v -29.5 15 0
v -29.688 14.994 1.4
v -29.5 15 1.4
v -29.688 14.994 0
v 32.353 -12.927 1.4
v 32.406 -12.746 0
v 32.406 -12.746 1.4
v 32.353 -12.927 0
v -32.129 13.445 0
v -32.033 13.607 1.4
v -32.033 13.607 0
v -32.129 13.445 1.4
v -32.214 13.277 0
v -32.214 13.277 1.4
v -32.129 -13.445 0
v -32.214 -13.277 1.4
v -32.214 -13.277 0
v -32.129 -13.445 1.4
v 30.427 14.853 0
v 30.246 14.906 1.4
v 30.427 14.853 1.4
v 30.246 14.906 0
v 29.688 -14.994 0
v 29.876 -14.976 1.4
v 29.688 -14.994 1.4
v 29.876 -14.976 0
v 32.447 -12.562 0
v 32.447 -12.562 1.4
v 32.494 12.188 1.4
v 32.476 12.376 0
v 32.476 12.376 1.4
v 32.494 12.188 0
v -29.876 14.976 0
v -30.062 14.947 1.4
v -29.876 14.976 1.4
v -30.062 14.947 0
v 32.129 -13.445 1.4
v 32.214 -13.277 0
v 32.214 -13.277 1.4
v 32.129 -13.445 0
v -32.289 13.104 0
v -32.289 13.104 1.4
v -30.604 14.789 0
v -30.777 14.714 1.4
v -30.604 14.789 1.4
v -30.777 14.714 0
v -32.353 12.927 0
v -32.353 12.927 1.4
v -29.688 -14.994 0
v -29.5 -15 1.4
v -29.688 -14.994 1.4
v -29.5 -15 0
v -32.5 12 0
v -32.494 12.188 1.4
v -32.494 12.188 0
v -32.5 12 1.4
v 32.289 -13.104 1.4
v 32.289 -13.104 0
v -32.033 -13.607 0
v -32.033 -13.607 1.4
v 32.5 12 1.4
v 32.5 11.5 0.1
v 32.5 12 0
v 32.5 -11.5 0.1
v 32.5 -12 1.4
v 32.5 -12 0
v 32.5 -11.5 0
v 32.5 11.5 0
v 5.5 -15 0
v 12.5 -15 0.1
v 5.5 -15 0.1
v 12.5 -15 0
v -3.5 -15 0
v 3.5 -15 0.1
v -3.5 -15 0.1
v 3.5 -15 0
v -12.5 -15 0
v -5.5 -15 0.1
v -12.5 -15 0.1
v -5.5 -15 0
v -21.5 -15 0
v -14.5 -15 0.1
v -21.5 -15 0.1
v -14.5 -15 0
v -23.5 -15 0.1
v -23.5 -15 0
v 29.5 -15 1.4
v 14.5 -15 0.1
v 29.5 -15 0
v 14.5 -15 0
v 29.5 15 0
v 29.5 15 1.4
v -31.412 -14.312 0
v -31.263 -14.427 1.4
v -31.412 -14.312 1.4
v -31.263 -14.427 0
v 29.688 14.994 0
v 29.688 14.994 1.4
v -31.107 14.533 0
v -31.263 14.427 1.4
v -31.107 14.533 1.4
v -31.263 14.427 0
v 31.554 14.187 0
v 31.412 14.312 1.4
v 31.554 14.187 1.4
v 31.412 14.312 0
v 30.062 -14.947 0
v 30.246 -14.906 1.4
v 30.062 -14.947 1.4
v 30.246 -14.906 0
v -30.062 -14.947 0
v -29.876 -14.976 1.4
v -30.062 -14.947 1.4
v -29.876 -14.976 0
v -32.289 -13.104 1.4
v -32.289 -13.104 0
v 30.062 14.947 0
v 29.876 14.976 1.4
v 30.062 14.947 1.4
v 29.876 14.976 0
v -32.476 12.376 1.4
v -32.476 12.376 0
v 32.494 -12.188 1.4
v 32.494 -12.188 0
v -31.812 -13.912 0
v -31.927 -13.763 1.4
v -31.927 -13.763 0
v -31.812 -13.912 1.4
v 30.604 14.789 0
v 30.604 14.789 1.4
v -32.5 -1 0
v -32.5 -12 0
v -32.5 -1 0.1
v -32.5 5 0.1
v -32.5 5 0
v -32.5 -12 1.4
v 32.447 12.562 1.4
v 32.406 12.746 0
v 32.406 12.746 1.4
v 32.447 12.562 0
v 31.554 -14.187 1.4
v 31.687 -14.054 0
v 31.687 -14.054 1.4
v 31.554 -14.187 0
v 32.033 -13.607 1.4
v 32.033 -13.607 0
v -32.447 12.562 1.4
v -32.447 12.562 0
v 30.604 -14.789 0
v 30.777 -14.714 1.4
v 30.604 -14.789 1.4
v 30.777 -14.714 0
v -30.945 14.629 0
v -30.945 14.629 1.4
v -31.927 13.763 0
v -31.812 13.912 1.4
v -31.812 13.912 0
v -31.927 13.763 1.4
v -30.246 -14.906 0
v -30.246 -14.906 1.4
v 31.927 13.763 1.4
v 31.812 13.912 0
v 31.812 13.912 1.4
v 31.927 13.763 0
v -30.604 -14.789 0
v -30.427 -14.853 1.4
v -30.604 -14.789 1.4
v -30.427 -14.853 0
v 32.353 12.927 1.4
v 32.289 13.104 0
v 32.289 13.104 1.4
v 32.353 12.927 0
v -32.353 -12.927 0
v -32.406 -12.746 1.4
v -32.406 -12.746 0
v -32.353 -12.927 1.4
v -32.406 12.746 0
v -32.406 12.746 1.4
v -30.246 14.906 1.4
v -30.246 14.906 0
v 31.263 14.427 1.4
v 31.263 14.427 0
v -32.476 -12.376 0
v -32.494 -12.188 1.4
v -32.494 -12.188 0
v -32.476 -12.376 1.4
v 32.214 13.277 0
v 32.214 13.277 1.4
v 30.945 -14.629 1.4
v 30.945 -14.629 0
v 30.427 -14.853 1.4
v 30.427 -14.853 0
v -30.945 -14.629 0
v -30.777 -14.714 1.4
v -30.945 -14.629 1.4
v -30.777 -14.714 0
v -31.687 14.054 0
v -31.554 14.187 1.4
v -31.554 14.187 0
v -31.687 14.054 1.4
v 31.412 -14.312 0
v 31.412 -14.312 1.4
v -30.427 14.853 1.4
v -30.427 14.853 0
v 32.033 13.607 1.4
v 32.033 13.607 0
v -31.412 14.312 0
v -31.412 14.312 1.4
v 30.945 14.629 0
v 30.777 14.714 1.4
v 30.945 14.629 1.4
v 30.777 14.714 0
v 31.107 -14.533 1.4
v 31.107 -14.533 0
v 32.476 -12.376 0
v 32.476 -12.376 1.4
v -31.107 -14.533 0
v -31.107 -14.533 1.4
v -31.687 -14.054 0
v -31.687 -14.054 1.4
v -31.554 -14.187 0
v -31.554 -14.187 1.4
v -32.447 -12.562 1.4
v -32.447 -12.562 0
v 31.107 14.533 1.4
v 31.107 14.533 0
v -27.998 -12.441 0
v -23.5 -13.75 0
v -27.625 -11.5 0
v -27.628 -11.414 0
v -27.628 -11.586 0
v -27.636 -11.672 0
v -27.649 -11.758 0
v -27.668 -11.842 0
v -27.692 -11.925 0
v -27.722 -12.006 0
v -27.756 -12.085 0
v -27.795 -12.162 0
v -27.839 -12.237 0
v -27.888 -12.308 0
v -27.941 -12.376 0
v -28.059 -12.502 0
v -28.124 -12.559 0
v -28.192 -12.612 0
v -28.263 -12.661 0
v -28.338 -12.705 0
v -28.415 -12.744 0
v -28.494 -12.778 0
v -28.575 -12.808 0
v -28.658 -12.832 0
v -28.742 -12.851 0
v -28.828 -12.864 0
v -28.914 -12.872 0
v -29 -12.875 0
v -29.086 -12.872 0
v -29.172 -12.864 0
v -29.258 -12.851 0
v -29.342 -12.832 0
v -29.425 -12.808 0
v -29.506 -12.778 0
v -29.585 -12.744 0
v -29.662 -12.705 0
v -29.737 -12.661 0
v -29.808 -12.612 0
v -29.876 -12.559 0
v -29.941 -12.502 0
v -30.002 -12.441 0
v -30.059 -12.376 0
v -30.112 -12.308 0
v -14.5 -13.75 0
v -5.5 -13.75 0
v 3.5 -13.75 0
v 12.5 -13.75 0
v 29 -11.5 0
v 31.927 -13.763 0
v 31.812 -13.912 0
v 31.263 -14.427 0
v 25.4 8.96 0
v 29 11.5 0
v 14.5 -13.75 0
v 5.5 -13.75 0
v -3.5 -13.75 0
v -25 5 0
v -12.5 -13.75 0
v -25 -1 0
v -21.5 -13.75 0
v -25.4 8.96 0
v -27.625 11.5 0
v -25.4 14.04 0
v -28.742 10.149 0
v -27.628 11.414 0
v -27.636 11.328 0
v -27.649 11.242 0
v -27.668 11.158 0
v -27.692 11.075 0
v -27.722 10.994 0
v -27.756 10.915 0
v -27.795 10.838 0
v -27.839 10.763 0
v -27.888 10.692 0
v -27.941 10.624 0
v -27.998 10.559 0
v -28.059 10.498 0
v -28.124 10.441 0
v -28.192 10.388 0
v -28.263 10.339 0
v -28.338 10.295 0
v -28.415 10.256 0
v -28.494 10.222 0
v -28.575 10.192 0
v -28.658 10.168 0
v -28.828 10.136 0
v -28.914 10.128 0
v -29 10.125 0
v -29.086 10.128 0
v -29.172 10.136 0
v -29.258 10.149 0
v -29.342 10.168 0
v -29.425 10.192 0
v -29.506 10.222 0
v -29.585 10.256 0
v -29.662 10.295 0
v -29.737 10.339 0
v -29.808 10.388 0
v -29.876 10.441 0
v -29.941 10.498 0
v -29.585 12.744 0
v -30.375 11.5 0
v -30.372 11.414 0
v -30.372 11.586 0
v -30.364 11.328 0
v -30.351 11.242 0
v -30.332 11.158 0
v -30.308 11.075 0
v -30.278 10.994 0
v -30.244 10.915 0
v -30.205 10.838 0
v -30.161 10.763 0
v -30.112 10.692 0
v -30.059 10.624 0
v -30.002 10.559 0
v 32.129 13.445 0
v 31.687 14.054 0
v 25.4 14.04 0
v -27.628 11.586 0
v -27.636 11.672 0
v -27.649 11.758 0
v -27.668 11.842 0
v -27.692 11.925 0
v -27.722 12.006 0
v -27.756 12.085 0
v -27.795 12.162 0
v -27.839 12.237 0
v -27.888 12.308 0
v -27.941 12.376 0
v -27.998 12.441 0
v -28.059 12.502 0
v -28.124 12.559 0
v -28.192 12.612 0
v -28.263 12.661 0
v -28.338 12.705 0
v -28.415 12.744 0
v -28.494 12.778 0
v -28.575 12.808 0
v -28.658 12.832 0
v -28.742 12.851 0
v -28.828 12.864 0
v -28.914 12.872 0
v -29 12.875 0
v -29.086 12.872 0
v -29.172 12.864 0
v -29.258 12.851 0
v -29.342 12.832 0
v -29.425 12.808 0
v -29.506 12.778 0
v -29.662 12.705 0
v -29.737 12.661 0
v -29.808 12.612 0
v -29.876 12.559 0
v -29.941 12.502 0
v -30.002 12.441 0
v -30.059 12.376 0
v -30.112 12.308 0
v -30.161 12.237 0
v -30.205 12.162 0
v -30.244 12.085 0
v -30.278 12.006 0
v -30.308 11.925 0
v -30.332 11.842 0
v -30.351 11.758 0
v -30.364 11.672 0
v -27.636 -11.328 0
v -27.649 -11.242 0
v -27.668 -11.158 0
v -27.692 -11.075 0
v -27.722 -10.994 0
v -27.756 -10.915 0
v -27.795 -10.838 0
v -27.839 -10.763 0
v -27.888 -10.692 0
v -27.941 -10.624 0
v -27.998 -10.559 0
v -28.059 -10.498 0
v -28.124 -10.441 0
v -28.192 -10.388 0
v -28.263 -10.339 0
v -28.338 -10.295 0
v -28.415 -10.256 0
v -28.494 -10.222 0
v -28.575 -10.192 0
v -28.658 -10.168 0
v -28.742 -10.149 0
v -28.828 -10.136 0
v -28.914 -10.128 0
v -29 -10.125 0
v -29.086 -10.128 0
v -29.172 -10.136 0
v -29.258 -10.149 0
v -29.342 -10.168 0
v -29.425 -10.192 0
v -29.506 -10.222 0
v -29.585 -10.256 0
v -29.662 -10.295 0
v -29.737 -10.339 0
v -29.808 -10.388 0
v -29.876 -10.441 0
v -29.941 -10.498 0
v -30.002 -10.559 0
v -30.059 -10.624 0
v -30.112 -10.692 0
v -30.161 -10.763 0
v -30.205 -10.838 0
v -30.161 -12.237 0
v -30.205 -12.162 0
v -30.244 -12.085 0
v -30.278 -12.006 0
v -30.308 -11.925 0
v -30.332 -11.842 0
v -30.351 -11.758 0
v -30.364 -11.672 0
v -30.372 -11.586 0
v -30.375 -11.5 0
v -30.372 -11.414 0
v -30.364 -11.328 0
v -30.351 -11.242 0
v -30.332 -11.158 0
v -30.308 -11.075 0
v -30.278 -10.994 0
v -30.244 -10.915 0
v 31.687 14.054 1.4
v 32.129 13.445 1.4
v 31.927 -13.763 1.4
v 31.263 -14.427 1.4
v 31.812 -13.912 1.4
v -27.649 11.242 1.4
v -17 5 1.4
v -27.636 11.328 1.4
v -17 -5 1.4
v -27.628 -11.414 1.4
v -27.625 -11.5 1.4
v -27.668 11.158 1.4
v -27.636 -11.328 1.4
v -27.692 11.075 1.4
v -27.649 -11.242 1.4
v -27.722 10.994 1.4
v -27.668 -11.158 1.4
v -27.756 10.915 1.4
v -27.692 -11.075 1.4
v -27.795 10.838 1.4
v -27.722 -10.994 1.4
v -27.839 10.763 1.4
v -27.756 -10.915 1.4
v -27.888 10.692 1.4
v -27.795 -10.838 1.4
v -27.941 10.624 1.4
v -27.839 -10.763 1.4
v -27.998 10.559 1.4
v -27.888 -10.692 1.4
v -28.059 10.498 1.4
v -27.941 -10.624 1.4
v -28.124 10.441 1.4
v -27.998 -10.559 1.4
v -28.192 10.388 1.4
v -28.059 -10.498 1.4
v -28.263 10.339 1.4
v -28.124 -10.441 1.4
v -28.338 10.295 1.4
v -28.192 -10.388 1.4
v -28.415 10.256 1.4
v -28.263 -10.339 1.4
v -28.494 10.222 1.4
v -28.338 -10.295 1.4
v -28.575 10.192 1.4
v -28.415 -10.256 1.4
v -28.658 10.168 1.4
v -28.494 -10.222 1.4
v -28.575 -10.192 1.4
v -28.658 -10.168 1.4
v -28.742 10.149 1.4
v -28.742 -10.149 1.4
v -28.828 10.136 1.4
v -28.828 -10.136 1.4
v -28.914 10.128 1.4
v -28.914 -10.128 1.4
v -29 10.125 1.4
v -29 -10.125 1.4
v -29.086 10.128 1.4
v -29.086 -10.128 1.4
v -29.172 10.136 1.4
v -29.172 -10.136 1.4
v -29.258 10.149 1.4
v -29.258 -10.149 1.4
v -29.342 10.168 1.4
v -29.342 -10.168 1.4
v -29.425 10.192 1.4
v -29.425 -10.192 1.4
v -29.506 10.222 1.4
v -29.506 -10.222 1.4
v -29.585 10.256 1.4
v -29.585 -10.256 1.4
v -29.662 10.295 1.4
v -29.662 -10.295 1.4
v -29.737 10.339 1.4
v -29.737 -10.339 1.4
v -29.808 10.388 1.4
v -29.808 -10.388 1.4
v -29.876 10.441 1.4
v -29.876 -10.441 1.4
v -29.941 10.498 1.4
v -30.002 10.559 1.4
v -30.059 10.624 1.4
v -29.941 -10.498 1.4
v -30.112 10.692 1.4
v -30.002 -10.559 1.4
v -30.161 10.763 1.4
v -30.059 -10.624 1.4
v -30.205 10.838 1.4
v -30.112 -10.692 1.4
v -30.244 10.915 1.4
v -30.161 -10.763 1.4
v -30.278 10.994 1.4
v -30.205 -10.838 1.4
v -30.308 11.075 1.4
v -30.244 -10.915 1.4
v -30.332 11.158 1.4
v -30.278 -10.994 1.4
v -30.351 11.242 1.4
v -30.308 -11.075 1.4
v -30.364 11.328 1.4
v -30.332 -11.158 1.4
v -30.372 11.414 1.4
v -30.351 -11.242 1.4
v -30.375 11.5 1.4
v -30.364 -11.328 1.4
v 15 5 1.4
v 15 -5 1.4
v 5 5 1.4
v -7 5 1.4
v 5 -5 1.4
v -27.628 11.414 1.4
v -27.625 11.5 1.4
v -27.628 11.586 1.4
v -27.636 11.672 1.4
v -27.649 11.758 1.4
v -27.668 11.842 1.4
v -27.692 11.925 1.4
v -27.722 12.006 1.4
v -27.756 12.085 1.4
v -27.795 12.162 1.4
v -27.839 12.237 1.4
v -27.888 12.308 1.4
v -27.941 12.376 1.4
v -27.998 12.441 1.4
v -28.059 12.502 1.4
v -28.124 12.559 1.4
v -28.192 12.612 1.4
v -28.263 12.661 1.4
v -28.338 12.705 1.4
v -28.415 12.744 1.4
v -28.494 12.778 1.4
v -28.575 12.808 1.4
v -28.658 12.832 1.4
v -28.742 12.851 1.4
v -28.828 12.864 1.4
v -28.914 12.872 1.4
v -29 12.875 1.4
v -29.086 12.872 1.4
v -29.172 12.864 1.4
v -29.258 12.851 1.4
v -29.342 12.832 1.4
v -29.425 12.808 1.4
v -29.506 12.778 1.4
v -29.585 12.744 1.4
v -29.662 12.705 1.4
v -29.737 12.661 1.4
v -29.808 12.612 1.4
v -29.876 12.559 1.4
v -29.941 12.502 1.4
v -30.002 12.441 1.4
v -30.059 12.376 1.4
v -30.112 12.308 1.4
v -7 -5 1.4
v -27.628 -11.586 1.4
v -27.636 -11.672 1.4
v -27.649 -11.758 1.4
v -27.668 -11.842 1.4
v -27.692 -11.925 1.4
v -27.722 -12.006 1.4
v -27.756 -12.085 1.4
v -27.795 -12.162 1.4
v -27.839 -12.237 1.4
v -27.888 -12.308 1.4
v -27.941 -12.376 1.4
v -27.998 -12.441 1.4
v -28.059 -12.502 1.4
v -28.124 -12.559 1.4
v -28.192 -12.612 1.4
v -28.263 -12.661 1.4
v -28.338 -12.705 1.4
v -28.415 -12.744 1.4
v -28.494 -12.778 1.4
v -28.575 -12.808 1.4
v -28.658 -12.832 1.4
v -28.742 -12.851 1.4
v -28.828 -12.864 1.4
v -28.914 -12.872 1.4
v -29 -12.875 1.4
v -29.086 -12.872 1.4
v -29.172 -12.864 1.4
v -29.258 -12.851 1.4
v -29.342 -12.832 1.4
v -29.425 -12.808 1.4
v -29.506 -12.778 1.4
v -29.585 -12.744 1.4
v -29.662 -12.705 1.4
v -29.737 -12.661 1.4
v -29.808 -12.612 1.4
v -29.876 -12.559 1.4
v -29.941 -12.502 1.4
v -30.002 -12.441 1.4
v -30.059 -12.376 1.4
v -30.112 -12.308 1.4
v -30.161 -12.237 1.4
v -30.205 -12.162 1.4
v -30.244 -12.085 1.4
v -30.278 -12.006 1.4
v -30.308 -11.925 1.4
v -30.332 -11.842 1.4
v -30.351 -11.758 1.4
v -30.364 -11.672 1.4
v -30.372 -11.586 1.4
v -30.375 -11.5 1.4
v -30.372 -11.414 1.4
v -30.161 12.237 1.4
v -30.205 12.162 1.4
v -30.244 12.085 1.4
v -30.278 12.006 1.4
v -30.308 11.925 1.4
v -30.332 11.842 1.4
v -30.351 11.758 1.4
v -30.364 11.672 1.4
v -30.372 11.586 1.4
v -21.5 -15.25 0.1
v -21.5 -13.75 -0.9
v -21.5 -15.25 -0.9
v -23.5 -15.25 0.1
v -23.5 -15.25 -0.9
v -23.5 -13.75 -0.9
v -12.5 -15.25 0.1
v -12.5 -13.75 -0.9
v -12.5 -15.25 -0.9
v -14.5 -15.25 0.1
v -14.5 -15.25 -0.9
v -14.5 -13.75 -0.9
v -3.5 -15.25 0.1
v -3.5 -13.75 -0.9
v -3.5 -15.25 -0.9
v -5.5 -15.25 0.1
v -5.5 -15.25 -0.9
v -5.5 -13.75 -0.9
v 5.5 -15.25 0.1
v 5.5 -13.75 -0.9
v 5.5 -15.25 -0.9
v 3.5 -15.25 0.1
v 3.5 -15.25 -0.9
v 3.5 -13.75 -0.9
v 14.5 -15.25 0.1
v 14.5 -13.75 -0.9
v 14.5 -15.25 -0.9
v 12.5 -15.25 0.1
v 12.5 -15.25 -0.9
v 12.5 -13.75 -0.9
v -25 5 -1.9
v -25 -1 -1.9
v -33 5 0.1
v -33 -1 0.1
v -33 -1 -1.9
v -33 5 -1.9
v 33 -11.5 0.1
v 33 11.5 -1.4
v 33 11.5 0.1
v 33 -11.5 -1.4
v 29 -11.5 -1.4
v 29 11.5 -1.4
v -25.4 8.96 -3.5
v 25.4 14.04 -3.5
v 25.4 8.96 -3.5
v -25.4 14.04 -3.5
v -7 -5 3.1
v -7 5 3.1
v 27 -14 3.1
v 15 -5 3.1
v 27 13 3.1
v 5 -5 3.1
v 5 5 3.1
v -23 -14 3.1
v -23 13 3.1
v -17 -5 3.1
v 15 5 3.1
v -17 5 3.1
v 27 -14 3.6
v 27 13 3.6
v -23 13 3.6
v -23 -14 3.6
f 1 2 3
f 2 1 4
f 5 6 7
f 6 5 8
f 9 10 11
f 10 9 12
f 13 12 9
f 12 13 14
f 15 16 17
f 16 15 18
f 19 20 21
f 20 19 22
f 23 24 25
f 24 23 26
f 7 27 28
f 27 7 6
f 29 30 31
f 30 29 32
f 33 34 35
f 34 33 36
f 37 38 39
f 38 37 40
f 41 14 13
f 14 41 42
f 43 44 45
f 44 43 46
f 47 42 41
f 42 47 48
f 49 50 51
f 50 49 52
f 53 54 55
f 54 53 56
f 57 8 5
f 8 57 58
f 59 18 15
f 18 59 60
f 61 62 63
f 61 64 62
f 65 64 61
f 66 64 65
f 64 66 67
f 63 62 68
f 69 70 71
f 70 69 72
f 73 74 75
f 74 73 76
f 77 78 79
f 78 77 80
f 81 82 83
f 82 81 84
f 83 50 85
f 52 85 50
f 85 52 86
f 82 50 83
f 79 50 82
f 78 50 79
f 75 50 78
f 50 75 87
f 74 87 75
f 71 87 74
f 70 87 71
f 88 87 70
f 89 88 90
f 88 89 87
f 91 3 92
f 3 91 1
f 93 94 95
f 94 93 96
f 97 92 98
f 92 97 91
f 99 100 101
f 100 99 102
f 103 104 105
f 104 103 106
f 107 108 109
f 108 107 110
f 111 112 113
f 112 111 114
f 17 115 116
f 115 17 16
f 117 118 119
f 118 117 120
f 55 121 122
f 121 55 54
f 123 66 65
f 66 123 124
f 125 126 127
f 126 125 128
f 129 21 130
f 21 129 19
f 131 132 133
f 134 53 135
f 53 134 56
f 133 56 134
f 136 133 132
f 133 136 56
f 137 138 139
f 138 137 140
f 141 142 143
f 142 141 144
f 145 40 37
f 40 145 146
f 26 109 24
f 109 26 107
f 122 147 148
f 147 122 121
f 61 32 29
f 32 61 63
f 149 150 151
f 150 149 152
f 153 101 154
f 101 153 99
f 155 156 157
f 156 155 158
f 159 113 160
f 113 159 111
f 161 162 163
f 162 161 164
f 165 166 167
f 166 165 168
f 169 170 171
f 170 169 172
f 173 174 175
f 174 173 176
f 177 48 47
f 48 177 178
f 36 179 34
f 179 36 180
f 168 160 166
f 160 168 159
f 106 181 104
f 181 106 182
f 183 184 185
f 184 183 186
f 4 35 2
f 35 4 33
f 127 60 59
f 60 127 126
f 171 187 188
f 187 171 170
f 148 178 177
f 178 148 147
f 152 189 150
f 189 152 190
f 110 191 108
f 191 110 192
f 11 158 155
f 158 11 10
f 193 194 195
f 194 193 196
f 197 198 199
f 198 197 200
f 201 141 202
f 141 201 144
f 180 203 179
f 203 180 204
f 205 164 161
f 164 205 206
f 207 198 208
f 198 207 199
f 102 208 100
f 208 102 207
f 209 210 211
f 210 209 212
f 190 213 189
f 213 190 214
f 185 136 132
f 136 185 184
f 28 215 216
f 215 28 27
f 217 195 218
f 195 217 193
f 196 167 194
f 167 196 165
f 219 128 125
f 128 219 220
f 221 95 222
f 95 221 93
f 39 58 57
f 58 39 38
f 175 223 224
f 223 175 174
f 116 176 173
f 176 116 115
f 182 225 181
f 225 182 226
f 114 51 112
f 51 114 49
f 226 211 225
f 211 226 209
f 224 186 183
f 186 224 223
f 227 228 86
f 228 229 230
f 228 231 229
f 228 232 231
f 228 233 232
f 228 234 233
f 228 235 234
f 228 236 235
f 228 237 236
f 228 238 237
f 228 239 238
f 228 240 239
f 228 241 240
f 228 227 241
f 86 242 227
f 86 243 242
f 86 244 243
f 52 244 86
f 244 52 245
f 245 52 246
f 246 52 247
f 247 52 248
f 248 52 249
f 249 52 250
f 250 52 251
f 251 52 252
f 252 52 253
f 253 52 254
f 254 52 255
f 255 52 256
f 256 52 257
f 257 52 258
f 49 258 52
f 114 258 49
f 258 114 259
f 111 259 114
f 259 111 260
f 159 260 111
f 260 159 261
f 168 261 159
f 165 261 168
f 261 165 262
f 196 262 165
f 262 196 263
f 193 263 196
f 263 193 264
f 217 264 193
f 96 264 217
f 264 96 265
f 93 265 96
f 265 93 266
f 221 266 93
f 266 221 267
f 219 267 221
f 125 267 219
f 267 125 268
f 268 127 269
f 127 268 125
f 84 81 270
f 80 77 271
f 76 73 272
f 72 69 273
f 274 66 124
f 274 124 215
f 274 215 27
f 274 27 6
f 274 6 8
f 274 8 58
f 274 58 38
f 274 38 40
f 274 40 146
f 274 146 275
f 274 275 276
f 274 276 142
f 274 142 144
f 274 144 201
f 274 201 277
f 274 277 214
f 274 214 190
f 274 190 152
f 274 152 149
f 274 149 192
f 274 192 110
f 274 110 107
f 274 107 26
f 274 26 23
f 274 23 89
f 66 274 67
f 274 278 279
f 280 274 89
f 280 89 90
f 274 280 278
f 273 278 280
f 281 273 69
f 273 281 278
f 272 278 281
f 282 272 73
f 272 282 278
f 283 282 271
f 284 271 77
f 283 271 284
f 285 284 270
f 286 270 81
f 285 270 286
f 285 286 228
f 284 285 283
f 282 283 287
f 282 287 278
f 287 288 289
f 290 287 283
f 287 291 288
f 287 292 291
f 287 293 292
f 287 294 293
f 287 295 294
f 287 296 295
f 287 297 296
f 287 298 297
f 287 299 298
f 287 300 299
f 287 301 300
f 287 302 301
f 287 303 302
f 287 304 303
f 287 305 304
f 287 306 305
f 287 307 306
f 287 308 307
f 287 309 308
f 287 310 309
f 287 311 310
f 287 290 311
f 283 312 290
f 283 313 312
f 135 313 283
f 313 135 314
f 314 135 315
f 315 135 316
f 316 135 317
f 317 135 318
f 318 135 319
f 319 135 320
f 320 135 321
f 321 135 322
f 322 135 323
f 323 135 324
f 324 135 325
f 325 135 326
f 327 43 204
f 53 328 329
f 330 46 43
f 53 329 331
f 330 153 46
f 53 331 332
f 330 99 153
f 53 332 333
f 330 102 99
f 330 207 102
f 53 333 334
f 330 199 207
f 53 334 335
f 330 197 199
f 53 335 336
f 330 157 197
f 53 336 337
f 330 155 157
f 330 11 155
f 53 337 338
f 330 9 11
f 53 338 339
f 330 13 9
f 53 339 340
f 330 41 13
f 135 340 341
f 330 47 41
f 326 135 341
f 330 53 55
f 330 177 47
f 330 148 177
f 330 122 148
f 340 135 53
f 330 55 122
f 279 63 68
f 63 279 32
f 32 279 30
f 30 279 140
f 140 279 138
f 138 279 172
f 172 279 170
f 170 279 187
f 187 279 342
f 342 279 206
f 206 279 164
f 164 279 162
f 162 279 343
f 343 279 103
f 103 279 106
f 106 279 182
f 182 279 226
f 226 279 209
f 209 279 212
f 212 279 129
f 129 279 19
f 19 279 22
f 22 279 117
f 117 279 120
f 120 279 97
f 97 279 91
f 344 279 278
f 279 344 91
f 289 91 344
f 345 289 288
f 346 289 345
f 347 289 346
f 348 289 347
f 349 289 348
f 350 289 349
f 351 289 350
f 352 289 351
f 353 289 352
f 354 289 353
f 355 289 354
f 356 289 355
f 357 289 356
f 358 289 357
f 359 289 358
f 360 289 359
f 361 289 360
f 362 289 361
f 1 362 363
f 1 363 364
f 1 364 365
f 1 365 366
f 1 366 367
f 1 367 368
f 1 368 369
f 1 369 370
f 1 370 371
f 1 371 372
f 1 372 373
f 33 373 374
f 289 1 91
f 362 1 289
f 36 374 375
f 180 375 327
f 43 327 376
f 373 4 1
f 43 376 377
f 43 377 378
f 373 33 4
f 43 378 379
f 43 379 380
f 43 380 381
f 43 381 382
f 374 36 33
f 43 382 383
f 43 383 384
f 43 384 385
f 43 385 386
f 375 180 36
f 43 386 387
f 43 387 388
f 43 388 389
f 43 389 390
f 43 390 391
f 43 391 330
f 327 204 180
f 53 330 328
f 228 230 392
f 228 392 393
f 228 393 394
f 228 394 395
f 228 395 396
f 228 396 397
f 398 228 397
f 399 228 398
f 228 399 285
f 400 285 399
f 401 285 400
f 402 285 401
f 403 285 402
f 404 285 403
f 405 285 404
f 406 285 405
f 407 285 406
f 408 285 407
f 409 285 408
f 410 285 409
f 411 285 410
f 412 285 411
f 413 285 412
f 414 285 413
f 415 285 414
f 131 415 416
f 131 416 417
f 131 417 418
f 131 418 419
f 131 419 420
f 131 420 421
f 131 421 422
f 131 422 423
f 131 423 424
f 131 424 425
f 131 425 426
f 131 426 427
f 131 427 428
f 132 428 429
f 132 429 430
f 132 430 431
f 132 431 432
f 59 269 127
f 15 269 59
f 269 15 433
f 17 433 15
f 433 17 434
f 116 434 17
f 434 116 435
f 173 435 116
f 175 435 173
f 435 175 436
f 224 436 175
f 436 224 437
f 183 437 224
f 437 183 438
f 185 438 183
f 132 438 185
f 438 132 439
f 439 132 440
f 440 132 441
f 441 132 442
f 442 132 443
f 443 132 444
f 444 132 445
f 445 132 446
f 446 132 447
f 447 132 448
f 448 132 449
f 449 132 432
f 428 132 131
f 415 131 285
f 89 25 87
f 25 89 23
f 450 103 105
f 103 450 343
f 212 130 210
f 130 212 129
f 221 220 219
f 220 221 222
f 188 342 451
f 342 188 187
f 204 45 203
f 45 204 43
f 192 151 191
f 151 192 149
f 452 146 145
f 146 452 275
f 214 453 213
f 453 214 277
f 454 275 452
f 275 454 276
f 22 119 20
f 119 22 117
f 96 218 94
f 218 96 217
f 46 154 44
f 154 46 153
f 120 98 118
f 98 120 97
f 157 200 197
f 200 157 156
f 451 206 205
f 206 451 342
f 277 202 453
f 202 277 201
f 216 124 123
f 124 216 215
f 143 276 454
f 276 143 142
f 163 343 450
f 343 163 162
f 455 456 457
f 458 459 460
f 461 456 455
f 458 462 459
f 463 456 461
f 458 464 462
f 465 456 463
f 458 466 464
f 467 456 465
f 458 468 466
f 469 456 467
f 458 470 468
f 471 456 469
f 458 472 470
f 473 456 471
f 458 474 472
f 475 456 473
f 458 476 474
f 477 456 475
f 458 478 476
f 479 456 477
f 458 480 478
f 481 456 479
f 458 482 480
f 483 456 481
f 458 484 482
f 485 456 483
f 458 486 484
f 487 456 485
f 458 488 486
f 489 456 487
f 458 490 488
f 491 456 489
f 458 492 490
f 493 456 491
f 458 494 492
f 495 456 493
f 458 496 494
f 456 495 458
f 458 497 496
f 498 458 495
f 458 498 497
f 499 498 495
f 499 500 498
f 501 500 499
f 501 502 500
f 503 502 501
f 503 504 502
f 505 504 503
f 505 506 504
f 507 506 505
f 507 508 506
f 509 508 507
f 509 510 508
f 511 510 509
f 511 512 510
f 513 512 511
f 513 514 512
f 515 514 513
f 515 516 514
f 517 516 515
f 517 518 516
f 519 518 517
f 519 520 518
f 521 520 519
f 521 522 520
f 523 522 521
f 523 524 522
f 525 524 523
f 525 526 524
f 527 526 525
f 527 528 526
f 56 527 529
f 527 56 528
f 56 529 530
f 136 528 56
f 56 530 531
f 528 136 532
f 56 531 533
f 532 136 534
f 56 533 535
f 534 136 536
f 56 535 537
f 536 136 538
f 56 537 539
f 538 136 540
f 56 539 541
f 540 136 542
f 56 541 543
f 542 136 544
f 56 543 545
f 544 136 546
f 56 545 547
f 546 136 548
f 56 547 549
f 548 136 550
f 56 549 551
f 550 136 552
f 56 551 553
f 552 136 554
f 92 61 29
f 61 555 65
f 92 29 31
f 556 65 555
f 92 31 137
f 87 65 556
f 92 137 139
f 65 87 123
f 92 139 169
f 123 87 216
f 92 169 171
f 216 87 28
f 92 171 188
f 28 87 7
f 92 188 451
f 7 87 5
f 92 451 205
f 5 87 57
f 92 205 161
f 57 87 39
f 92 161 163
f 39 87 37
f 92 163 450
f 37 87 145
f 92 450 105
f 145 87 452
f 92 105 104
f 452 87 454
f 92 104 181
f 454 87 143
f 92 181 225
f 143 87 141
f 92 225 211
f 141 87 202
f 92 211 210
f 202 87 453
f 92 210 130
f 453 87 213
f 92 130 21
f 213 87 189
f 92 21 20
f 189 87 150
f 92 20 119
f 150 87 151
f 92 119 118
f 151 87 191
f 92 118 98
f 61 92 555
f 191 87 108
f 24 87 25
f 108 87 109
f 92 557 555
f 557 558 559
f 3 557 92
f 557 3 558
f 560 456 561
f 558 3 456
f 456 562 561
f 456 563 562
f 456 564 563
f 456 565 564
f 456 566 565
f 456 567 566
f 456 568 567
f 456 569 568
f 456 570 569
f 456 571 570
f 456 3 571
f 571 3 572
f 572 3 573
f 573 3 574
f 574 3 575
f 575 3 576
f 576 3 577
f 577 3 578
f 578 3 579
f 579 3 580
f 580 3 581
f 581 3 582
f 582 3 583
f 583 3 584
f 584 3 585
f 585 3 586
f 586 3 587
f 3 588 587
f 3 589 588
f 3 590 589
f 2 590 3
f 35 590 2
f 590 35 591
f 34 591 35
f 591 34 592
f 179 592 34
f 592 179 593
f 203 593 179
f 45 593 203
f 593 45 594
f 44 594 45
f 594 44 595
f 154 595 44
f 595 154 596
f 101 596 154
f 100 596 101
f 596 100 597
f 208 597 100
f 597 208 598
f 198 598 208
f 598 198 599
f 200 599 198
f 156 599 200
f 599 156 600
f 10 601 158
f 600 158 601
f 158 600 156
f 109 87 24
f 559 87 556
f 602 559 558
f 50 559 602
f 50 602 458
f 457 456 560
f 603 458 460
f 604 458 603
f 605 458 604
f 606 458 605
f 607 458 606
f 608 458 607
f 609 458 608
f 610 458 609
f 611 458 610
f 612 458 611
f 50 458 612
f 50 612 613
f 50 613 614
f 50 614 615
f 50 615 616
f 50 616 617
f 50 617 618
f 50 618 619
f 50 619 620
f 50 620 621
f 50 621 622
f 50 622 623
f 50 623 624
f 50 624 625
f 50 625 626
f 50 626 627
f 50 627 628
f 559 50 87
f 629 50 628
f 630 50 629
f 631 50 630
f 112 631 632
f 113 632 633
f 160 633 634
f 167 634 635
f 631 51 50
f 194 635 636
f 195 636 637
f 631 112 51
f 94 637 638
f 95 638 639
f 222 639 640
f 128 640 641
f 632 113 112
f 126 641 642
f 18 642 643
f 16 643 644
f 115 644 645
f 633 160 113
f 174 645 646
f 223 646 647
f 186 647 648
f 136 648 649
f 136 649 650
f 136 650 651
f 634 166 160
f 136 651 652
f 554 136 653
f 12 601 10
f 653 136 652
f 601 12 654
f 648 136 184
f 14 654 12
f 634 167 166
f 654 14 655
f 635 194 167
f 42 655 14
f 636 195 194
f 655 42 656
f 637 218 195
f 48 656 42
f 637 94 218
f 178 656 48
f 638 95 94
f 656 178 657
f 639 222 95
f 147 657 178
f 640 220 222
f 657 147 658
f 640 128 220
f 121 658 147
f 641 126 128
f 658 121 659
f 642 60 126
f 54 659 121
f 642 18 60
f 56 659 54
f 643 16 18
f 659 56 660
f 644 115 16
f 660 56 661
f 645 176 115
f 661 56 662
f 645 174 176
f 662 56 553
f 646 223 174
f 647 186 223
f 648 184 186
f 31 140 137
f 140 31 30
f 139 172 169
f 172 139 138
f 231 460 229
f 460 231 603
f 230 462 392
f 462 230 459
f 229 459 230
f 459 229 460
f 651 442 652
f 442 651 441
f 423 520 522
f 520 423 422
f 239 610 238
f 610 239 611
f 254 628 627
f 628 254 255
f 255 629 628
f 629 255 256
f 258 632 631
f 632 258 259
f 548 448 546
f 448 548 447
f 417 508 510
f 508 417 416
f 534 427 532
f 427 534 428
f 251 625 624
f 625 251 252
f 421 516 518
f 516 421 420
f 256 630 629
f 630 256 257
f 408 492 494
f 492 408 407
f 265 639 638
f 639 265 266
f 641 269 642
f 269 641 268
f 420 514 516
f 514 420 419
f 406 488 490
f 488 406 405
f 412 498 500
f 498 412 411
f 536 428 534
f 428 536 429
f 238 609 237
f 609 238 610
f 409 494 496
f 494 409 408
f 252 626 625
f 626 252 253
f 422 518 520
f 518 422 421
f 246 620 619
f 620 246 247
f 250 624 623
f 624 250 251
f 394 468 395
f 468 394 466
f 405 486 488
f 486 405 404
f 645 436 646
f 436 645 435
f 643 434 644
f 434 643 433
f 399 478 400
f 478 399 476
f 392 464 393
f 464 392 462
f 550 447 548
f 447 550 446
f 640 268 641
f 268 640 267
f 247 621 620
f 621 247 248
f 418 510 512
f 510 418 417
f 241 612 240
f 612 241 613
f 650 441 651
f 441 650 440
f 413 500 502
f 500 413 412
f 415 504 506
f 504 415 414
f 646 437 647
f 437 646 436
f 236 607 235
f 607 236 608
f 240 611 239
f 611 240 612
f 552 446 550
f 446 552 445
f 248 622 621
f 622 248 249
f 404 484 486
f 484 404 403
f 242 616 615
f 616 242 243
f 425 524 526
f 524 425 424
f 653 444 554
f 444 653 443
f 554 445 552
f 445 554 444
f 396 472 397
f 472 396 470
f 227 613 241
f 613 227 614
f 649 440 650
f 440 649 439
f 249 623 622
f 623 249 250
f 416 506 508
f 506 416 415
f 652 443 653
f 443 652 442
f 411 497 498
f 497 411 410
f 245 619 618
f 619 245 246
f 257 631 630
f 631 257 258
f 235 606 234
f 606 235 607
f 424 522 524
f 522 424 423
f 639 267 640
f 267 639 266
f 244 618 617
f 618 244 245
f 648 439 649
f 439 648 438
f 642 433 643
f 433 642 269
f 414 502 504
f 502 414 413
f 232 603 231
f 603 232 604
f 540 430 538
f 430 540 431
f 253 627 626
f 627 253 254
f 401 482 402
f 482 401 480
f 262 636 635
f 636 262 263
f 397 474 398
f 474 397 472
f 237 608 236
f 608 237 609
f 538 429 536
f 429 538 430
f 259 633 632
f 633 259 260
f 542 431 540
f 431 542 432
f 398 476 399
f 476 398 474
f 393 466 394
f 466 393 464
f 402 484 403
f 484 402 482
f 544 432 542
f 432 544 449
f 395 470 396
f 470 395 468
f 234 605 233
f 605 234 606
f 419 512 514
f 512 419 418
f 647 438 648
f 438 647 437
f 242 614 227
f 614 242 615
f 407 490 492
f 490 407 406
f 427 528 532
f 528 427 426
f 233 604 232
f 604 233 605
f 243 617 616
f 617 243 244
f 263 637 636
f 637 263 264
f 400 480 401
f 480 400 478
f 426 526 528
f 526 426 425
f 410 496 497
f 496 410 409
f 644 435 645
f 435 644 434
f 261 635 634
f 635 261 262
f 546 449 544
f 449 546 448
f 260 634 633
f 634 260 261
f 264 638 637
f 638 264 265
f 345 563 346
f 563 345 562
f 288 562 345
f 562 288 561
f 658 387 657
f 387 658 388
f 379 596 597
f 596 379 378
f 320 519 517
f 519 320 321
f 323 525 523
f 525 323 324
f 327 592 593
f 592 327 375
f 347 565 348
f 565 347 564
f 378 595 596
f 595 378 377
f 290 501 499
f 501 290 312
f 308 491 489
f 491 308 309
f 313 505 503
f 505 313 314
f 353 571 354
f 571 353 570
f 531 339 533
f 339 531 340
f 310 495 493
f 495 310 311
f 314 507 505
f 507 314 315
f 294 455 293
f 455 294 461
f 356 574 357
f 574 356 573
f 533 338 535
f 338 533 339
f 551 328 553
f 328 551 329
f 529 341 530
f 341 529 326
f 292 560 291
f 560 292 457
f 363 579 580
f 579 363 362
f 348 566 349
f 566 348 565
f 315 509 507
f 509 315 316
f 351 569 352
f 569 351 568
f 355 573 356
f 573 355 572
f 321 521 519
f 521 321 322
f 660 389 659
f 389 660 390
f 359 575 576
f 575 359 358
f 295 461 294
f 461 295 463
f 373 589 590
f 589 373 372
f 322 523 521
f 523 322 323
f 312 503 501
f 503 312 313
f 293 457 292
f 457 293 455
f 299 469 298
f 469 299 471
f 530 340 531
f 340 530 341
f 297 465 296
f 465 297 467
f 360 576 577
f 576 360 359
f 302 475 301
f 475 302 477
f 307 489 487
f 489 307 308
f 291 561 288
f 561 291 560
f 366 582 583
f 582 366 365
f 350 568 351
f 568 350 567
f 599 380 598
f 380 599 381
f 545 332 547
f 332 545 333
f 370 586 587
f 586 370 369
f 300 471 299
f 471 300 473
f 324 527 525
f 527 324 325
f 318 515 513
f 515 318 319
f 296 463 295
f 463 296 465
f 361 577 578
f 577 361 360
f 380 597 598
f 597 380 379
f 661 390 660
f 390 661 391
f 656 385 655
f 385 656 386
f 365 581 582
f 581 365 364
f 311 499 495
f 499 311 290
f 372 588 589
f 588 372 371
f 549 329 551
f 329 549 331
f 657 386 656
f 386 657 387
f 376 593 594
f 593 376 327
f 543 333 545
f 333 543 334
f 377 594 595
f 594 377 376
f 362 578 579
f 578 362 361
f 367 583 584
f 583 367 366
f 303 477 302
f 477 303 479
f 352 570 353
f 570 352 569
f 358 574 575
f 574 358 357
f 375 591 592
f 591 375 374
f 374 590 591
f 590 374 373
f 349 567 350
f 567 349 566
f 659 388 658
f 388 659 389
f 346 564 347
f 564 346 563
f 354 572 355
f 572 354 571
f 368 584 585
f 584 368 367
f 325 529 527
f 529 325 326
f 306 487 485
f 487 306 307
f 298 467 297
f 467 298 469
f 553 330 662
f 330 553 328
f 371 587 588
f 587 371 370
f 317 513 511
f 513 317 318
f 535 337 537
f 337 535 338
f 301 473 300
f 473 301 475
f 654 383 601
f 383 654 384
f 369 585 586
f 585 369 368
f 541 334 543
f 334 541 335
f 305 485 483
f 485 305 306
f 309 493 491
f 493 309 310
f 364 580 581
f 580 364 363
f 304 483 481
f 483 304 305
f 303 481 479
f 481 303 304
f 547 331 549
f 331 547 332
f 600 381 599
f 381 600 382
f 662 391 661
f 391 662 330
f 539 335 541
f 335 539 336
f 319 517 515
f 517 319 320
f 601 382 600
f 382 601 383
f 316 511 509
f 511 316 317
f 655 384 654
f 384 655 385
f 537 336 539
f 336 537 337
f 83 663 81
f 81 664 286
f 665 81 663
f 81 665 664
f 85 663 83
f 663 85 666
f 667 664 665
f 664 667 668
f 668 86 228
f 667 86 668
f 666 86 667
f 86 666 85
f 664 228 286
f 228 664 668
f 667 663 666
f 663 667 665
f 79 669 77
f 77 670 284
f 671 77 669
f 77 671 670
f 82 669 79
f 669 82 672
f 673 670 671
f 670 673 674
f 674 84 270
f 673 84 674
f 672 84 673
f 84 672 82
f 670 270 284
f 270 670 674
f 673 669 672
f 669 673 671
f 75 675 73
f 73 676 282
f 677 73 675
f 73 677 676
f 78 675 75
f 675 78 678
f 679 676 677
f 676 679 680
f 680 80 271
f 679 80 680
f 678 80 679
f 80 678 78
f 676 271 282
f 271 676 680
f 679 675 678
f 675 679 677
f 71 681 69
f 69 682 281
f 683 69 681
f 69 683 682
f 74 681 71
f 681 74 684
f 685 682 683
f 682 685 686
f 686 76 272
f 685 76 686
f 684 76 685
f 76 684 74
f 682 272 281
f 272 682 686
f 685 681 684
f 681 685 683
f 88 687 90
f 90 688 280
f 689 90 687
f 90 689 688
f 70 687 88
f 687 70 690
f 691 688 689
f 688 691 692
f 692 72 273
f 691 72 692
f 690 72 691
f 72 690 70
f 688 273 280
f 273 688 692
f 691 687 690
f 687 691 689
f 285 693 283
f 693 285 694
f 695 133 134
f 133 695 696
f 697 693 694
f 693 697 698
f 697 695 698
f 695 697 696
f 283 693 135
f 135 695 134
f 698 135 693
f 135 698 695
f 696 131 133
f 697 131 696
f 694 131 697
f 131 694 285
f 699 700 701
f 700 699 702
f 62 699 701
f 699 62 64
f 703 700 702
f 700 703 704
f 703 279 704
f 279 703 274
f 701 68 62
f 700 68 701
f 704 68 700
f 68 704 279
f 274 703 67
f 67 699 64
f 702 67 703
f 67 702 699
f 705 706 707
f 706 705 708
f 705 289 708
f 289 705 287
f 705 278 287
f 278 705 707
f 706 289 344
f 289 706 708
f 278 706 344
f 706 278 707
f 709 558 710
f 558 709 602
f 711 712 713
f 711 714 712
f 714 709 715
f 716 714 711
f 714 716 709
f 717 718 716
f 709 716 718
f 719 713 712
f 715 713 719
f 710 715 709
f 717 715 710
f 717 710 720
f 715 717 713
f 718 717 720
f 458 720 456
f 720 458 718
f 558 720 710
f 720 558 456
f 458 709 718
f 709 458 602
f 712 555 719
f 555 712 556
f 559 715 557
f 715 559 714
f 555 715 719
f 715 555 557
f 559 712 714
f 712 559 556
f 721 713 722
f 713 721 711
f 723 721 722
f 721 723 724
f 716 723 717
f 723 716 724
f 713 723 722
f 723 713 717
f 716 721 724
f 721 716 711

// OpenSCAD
/* (c) 2018 by fredg02 
 *  https://github.com/fredg02/raspberrypi_library
 *
 * PaPiRus hat model library for generating cases etc.
 *
 * Based on model library from Saarbastler:
 * https://github.com/saarbastler/library.scad
 *
 */

$fn=100;

// female header
module female_header(pins, rows) {
  color("black") cube([2.54*pins,2.54*rows,3.5]);
}

// PaPiRus HAT for Raspberry Pi Zero W
module papirus_hat_pizero() {
    // PCB
    color("white") difference() {
        hull() {
          translate([-(65-6)/2,-(30-6)/2,0]) cylinder(r=3, h=1.4 );
          translate([-(65-6)/2, (30-6)/2,0]) cylinder(r=3, h=1.4 );
          translate([ (65-6)/2,-(30-6)/2,0]) cylinder(r=3, h=1.4 );
          translate([ (65-6)/2, (30-6)/2,0]) cylinder(r=3, h=1.4 );
        }
        // holes
        translate([-65/2+3.5,-23/2,-1]) cylinder(d=2.75, h=3);
        translate([-65/2+3.5, 23/2,-1]) cylinder(d=2.75, h=3);
    }

    translate([3.5-65/2+29-10*2.54,30/2-3.5-2.54,0]) {
        mirror([0,0,1]) female_header(20,2);
    }
    
    translate([-65/2,-30/2,-1.4]) {
        // jumper
        color("silver") translate([-0.5,17-6/2,-0.5]) cube([8,6,2]);    

        // buttons
        for(x=[10, 19, 28, 37, 46]) {
            color("silver") translate([x-2/2, -0.25,0.5]) cube([2, 1.5, 1]);
        }
    
        // screen port
        screen_port_width=23;
        color("darkgrey") translate([65-3.5,(30-screen_port_width)/2,0]) cube([4, screen_port_width, 1.5]);  
    }
    // pads
    color("lightgrey") translate([-17, -5, 1.4]) cube([10, 10, 1.7]);
    color("lightgrey") translate([5, -5, 1.4]) cube([10, 10, 1.7]);
    
    // screen
    color("lightgrey") translate([-23, -14, 3.1]) cube([50, 27, 0.5]);  
}

papirus_hat_pizero();
